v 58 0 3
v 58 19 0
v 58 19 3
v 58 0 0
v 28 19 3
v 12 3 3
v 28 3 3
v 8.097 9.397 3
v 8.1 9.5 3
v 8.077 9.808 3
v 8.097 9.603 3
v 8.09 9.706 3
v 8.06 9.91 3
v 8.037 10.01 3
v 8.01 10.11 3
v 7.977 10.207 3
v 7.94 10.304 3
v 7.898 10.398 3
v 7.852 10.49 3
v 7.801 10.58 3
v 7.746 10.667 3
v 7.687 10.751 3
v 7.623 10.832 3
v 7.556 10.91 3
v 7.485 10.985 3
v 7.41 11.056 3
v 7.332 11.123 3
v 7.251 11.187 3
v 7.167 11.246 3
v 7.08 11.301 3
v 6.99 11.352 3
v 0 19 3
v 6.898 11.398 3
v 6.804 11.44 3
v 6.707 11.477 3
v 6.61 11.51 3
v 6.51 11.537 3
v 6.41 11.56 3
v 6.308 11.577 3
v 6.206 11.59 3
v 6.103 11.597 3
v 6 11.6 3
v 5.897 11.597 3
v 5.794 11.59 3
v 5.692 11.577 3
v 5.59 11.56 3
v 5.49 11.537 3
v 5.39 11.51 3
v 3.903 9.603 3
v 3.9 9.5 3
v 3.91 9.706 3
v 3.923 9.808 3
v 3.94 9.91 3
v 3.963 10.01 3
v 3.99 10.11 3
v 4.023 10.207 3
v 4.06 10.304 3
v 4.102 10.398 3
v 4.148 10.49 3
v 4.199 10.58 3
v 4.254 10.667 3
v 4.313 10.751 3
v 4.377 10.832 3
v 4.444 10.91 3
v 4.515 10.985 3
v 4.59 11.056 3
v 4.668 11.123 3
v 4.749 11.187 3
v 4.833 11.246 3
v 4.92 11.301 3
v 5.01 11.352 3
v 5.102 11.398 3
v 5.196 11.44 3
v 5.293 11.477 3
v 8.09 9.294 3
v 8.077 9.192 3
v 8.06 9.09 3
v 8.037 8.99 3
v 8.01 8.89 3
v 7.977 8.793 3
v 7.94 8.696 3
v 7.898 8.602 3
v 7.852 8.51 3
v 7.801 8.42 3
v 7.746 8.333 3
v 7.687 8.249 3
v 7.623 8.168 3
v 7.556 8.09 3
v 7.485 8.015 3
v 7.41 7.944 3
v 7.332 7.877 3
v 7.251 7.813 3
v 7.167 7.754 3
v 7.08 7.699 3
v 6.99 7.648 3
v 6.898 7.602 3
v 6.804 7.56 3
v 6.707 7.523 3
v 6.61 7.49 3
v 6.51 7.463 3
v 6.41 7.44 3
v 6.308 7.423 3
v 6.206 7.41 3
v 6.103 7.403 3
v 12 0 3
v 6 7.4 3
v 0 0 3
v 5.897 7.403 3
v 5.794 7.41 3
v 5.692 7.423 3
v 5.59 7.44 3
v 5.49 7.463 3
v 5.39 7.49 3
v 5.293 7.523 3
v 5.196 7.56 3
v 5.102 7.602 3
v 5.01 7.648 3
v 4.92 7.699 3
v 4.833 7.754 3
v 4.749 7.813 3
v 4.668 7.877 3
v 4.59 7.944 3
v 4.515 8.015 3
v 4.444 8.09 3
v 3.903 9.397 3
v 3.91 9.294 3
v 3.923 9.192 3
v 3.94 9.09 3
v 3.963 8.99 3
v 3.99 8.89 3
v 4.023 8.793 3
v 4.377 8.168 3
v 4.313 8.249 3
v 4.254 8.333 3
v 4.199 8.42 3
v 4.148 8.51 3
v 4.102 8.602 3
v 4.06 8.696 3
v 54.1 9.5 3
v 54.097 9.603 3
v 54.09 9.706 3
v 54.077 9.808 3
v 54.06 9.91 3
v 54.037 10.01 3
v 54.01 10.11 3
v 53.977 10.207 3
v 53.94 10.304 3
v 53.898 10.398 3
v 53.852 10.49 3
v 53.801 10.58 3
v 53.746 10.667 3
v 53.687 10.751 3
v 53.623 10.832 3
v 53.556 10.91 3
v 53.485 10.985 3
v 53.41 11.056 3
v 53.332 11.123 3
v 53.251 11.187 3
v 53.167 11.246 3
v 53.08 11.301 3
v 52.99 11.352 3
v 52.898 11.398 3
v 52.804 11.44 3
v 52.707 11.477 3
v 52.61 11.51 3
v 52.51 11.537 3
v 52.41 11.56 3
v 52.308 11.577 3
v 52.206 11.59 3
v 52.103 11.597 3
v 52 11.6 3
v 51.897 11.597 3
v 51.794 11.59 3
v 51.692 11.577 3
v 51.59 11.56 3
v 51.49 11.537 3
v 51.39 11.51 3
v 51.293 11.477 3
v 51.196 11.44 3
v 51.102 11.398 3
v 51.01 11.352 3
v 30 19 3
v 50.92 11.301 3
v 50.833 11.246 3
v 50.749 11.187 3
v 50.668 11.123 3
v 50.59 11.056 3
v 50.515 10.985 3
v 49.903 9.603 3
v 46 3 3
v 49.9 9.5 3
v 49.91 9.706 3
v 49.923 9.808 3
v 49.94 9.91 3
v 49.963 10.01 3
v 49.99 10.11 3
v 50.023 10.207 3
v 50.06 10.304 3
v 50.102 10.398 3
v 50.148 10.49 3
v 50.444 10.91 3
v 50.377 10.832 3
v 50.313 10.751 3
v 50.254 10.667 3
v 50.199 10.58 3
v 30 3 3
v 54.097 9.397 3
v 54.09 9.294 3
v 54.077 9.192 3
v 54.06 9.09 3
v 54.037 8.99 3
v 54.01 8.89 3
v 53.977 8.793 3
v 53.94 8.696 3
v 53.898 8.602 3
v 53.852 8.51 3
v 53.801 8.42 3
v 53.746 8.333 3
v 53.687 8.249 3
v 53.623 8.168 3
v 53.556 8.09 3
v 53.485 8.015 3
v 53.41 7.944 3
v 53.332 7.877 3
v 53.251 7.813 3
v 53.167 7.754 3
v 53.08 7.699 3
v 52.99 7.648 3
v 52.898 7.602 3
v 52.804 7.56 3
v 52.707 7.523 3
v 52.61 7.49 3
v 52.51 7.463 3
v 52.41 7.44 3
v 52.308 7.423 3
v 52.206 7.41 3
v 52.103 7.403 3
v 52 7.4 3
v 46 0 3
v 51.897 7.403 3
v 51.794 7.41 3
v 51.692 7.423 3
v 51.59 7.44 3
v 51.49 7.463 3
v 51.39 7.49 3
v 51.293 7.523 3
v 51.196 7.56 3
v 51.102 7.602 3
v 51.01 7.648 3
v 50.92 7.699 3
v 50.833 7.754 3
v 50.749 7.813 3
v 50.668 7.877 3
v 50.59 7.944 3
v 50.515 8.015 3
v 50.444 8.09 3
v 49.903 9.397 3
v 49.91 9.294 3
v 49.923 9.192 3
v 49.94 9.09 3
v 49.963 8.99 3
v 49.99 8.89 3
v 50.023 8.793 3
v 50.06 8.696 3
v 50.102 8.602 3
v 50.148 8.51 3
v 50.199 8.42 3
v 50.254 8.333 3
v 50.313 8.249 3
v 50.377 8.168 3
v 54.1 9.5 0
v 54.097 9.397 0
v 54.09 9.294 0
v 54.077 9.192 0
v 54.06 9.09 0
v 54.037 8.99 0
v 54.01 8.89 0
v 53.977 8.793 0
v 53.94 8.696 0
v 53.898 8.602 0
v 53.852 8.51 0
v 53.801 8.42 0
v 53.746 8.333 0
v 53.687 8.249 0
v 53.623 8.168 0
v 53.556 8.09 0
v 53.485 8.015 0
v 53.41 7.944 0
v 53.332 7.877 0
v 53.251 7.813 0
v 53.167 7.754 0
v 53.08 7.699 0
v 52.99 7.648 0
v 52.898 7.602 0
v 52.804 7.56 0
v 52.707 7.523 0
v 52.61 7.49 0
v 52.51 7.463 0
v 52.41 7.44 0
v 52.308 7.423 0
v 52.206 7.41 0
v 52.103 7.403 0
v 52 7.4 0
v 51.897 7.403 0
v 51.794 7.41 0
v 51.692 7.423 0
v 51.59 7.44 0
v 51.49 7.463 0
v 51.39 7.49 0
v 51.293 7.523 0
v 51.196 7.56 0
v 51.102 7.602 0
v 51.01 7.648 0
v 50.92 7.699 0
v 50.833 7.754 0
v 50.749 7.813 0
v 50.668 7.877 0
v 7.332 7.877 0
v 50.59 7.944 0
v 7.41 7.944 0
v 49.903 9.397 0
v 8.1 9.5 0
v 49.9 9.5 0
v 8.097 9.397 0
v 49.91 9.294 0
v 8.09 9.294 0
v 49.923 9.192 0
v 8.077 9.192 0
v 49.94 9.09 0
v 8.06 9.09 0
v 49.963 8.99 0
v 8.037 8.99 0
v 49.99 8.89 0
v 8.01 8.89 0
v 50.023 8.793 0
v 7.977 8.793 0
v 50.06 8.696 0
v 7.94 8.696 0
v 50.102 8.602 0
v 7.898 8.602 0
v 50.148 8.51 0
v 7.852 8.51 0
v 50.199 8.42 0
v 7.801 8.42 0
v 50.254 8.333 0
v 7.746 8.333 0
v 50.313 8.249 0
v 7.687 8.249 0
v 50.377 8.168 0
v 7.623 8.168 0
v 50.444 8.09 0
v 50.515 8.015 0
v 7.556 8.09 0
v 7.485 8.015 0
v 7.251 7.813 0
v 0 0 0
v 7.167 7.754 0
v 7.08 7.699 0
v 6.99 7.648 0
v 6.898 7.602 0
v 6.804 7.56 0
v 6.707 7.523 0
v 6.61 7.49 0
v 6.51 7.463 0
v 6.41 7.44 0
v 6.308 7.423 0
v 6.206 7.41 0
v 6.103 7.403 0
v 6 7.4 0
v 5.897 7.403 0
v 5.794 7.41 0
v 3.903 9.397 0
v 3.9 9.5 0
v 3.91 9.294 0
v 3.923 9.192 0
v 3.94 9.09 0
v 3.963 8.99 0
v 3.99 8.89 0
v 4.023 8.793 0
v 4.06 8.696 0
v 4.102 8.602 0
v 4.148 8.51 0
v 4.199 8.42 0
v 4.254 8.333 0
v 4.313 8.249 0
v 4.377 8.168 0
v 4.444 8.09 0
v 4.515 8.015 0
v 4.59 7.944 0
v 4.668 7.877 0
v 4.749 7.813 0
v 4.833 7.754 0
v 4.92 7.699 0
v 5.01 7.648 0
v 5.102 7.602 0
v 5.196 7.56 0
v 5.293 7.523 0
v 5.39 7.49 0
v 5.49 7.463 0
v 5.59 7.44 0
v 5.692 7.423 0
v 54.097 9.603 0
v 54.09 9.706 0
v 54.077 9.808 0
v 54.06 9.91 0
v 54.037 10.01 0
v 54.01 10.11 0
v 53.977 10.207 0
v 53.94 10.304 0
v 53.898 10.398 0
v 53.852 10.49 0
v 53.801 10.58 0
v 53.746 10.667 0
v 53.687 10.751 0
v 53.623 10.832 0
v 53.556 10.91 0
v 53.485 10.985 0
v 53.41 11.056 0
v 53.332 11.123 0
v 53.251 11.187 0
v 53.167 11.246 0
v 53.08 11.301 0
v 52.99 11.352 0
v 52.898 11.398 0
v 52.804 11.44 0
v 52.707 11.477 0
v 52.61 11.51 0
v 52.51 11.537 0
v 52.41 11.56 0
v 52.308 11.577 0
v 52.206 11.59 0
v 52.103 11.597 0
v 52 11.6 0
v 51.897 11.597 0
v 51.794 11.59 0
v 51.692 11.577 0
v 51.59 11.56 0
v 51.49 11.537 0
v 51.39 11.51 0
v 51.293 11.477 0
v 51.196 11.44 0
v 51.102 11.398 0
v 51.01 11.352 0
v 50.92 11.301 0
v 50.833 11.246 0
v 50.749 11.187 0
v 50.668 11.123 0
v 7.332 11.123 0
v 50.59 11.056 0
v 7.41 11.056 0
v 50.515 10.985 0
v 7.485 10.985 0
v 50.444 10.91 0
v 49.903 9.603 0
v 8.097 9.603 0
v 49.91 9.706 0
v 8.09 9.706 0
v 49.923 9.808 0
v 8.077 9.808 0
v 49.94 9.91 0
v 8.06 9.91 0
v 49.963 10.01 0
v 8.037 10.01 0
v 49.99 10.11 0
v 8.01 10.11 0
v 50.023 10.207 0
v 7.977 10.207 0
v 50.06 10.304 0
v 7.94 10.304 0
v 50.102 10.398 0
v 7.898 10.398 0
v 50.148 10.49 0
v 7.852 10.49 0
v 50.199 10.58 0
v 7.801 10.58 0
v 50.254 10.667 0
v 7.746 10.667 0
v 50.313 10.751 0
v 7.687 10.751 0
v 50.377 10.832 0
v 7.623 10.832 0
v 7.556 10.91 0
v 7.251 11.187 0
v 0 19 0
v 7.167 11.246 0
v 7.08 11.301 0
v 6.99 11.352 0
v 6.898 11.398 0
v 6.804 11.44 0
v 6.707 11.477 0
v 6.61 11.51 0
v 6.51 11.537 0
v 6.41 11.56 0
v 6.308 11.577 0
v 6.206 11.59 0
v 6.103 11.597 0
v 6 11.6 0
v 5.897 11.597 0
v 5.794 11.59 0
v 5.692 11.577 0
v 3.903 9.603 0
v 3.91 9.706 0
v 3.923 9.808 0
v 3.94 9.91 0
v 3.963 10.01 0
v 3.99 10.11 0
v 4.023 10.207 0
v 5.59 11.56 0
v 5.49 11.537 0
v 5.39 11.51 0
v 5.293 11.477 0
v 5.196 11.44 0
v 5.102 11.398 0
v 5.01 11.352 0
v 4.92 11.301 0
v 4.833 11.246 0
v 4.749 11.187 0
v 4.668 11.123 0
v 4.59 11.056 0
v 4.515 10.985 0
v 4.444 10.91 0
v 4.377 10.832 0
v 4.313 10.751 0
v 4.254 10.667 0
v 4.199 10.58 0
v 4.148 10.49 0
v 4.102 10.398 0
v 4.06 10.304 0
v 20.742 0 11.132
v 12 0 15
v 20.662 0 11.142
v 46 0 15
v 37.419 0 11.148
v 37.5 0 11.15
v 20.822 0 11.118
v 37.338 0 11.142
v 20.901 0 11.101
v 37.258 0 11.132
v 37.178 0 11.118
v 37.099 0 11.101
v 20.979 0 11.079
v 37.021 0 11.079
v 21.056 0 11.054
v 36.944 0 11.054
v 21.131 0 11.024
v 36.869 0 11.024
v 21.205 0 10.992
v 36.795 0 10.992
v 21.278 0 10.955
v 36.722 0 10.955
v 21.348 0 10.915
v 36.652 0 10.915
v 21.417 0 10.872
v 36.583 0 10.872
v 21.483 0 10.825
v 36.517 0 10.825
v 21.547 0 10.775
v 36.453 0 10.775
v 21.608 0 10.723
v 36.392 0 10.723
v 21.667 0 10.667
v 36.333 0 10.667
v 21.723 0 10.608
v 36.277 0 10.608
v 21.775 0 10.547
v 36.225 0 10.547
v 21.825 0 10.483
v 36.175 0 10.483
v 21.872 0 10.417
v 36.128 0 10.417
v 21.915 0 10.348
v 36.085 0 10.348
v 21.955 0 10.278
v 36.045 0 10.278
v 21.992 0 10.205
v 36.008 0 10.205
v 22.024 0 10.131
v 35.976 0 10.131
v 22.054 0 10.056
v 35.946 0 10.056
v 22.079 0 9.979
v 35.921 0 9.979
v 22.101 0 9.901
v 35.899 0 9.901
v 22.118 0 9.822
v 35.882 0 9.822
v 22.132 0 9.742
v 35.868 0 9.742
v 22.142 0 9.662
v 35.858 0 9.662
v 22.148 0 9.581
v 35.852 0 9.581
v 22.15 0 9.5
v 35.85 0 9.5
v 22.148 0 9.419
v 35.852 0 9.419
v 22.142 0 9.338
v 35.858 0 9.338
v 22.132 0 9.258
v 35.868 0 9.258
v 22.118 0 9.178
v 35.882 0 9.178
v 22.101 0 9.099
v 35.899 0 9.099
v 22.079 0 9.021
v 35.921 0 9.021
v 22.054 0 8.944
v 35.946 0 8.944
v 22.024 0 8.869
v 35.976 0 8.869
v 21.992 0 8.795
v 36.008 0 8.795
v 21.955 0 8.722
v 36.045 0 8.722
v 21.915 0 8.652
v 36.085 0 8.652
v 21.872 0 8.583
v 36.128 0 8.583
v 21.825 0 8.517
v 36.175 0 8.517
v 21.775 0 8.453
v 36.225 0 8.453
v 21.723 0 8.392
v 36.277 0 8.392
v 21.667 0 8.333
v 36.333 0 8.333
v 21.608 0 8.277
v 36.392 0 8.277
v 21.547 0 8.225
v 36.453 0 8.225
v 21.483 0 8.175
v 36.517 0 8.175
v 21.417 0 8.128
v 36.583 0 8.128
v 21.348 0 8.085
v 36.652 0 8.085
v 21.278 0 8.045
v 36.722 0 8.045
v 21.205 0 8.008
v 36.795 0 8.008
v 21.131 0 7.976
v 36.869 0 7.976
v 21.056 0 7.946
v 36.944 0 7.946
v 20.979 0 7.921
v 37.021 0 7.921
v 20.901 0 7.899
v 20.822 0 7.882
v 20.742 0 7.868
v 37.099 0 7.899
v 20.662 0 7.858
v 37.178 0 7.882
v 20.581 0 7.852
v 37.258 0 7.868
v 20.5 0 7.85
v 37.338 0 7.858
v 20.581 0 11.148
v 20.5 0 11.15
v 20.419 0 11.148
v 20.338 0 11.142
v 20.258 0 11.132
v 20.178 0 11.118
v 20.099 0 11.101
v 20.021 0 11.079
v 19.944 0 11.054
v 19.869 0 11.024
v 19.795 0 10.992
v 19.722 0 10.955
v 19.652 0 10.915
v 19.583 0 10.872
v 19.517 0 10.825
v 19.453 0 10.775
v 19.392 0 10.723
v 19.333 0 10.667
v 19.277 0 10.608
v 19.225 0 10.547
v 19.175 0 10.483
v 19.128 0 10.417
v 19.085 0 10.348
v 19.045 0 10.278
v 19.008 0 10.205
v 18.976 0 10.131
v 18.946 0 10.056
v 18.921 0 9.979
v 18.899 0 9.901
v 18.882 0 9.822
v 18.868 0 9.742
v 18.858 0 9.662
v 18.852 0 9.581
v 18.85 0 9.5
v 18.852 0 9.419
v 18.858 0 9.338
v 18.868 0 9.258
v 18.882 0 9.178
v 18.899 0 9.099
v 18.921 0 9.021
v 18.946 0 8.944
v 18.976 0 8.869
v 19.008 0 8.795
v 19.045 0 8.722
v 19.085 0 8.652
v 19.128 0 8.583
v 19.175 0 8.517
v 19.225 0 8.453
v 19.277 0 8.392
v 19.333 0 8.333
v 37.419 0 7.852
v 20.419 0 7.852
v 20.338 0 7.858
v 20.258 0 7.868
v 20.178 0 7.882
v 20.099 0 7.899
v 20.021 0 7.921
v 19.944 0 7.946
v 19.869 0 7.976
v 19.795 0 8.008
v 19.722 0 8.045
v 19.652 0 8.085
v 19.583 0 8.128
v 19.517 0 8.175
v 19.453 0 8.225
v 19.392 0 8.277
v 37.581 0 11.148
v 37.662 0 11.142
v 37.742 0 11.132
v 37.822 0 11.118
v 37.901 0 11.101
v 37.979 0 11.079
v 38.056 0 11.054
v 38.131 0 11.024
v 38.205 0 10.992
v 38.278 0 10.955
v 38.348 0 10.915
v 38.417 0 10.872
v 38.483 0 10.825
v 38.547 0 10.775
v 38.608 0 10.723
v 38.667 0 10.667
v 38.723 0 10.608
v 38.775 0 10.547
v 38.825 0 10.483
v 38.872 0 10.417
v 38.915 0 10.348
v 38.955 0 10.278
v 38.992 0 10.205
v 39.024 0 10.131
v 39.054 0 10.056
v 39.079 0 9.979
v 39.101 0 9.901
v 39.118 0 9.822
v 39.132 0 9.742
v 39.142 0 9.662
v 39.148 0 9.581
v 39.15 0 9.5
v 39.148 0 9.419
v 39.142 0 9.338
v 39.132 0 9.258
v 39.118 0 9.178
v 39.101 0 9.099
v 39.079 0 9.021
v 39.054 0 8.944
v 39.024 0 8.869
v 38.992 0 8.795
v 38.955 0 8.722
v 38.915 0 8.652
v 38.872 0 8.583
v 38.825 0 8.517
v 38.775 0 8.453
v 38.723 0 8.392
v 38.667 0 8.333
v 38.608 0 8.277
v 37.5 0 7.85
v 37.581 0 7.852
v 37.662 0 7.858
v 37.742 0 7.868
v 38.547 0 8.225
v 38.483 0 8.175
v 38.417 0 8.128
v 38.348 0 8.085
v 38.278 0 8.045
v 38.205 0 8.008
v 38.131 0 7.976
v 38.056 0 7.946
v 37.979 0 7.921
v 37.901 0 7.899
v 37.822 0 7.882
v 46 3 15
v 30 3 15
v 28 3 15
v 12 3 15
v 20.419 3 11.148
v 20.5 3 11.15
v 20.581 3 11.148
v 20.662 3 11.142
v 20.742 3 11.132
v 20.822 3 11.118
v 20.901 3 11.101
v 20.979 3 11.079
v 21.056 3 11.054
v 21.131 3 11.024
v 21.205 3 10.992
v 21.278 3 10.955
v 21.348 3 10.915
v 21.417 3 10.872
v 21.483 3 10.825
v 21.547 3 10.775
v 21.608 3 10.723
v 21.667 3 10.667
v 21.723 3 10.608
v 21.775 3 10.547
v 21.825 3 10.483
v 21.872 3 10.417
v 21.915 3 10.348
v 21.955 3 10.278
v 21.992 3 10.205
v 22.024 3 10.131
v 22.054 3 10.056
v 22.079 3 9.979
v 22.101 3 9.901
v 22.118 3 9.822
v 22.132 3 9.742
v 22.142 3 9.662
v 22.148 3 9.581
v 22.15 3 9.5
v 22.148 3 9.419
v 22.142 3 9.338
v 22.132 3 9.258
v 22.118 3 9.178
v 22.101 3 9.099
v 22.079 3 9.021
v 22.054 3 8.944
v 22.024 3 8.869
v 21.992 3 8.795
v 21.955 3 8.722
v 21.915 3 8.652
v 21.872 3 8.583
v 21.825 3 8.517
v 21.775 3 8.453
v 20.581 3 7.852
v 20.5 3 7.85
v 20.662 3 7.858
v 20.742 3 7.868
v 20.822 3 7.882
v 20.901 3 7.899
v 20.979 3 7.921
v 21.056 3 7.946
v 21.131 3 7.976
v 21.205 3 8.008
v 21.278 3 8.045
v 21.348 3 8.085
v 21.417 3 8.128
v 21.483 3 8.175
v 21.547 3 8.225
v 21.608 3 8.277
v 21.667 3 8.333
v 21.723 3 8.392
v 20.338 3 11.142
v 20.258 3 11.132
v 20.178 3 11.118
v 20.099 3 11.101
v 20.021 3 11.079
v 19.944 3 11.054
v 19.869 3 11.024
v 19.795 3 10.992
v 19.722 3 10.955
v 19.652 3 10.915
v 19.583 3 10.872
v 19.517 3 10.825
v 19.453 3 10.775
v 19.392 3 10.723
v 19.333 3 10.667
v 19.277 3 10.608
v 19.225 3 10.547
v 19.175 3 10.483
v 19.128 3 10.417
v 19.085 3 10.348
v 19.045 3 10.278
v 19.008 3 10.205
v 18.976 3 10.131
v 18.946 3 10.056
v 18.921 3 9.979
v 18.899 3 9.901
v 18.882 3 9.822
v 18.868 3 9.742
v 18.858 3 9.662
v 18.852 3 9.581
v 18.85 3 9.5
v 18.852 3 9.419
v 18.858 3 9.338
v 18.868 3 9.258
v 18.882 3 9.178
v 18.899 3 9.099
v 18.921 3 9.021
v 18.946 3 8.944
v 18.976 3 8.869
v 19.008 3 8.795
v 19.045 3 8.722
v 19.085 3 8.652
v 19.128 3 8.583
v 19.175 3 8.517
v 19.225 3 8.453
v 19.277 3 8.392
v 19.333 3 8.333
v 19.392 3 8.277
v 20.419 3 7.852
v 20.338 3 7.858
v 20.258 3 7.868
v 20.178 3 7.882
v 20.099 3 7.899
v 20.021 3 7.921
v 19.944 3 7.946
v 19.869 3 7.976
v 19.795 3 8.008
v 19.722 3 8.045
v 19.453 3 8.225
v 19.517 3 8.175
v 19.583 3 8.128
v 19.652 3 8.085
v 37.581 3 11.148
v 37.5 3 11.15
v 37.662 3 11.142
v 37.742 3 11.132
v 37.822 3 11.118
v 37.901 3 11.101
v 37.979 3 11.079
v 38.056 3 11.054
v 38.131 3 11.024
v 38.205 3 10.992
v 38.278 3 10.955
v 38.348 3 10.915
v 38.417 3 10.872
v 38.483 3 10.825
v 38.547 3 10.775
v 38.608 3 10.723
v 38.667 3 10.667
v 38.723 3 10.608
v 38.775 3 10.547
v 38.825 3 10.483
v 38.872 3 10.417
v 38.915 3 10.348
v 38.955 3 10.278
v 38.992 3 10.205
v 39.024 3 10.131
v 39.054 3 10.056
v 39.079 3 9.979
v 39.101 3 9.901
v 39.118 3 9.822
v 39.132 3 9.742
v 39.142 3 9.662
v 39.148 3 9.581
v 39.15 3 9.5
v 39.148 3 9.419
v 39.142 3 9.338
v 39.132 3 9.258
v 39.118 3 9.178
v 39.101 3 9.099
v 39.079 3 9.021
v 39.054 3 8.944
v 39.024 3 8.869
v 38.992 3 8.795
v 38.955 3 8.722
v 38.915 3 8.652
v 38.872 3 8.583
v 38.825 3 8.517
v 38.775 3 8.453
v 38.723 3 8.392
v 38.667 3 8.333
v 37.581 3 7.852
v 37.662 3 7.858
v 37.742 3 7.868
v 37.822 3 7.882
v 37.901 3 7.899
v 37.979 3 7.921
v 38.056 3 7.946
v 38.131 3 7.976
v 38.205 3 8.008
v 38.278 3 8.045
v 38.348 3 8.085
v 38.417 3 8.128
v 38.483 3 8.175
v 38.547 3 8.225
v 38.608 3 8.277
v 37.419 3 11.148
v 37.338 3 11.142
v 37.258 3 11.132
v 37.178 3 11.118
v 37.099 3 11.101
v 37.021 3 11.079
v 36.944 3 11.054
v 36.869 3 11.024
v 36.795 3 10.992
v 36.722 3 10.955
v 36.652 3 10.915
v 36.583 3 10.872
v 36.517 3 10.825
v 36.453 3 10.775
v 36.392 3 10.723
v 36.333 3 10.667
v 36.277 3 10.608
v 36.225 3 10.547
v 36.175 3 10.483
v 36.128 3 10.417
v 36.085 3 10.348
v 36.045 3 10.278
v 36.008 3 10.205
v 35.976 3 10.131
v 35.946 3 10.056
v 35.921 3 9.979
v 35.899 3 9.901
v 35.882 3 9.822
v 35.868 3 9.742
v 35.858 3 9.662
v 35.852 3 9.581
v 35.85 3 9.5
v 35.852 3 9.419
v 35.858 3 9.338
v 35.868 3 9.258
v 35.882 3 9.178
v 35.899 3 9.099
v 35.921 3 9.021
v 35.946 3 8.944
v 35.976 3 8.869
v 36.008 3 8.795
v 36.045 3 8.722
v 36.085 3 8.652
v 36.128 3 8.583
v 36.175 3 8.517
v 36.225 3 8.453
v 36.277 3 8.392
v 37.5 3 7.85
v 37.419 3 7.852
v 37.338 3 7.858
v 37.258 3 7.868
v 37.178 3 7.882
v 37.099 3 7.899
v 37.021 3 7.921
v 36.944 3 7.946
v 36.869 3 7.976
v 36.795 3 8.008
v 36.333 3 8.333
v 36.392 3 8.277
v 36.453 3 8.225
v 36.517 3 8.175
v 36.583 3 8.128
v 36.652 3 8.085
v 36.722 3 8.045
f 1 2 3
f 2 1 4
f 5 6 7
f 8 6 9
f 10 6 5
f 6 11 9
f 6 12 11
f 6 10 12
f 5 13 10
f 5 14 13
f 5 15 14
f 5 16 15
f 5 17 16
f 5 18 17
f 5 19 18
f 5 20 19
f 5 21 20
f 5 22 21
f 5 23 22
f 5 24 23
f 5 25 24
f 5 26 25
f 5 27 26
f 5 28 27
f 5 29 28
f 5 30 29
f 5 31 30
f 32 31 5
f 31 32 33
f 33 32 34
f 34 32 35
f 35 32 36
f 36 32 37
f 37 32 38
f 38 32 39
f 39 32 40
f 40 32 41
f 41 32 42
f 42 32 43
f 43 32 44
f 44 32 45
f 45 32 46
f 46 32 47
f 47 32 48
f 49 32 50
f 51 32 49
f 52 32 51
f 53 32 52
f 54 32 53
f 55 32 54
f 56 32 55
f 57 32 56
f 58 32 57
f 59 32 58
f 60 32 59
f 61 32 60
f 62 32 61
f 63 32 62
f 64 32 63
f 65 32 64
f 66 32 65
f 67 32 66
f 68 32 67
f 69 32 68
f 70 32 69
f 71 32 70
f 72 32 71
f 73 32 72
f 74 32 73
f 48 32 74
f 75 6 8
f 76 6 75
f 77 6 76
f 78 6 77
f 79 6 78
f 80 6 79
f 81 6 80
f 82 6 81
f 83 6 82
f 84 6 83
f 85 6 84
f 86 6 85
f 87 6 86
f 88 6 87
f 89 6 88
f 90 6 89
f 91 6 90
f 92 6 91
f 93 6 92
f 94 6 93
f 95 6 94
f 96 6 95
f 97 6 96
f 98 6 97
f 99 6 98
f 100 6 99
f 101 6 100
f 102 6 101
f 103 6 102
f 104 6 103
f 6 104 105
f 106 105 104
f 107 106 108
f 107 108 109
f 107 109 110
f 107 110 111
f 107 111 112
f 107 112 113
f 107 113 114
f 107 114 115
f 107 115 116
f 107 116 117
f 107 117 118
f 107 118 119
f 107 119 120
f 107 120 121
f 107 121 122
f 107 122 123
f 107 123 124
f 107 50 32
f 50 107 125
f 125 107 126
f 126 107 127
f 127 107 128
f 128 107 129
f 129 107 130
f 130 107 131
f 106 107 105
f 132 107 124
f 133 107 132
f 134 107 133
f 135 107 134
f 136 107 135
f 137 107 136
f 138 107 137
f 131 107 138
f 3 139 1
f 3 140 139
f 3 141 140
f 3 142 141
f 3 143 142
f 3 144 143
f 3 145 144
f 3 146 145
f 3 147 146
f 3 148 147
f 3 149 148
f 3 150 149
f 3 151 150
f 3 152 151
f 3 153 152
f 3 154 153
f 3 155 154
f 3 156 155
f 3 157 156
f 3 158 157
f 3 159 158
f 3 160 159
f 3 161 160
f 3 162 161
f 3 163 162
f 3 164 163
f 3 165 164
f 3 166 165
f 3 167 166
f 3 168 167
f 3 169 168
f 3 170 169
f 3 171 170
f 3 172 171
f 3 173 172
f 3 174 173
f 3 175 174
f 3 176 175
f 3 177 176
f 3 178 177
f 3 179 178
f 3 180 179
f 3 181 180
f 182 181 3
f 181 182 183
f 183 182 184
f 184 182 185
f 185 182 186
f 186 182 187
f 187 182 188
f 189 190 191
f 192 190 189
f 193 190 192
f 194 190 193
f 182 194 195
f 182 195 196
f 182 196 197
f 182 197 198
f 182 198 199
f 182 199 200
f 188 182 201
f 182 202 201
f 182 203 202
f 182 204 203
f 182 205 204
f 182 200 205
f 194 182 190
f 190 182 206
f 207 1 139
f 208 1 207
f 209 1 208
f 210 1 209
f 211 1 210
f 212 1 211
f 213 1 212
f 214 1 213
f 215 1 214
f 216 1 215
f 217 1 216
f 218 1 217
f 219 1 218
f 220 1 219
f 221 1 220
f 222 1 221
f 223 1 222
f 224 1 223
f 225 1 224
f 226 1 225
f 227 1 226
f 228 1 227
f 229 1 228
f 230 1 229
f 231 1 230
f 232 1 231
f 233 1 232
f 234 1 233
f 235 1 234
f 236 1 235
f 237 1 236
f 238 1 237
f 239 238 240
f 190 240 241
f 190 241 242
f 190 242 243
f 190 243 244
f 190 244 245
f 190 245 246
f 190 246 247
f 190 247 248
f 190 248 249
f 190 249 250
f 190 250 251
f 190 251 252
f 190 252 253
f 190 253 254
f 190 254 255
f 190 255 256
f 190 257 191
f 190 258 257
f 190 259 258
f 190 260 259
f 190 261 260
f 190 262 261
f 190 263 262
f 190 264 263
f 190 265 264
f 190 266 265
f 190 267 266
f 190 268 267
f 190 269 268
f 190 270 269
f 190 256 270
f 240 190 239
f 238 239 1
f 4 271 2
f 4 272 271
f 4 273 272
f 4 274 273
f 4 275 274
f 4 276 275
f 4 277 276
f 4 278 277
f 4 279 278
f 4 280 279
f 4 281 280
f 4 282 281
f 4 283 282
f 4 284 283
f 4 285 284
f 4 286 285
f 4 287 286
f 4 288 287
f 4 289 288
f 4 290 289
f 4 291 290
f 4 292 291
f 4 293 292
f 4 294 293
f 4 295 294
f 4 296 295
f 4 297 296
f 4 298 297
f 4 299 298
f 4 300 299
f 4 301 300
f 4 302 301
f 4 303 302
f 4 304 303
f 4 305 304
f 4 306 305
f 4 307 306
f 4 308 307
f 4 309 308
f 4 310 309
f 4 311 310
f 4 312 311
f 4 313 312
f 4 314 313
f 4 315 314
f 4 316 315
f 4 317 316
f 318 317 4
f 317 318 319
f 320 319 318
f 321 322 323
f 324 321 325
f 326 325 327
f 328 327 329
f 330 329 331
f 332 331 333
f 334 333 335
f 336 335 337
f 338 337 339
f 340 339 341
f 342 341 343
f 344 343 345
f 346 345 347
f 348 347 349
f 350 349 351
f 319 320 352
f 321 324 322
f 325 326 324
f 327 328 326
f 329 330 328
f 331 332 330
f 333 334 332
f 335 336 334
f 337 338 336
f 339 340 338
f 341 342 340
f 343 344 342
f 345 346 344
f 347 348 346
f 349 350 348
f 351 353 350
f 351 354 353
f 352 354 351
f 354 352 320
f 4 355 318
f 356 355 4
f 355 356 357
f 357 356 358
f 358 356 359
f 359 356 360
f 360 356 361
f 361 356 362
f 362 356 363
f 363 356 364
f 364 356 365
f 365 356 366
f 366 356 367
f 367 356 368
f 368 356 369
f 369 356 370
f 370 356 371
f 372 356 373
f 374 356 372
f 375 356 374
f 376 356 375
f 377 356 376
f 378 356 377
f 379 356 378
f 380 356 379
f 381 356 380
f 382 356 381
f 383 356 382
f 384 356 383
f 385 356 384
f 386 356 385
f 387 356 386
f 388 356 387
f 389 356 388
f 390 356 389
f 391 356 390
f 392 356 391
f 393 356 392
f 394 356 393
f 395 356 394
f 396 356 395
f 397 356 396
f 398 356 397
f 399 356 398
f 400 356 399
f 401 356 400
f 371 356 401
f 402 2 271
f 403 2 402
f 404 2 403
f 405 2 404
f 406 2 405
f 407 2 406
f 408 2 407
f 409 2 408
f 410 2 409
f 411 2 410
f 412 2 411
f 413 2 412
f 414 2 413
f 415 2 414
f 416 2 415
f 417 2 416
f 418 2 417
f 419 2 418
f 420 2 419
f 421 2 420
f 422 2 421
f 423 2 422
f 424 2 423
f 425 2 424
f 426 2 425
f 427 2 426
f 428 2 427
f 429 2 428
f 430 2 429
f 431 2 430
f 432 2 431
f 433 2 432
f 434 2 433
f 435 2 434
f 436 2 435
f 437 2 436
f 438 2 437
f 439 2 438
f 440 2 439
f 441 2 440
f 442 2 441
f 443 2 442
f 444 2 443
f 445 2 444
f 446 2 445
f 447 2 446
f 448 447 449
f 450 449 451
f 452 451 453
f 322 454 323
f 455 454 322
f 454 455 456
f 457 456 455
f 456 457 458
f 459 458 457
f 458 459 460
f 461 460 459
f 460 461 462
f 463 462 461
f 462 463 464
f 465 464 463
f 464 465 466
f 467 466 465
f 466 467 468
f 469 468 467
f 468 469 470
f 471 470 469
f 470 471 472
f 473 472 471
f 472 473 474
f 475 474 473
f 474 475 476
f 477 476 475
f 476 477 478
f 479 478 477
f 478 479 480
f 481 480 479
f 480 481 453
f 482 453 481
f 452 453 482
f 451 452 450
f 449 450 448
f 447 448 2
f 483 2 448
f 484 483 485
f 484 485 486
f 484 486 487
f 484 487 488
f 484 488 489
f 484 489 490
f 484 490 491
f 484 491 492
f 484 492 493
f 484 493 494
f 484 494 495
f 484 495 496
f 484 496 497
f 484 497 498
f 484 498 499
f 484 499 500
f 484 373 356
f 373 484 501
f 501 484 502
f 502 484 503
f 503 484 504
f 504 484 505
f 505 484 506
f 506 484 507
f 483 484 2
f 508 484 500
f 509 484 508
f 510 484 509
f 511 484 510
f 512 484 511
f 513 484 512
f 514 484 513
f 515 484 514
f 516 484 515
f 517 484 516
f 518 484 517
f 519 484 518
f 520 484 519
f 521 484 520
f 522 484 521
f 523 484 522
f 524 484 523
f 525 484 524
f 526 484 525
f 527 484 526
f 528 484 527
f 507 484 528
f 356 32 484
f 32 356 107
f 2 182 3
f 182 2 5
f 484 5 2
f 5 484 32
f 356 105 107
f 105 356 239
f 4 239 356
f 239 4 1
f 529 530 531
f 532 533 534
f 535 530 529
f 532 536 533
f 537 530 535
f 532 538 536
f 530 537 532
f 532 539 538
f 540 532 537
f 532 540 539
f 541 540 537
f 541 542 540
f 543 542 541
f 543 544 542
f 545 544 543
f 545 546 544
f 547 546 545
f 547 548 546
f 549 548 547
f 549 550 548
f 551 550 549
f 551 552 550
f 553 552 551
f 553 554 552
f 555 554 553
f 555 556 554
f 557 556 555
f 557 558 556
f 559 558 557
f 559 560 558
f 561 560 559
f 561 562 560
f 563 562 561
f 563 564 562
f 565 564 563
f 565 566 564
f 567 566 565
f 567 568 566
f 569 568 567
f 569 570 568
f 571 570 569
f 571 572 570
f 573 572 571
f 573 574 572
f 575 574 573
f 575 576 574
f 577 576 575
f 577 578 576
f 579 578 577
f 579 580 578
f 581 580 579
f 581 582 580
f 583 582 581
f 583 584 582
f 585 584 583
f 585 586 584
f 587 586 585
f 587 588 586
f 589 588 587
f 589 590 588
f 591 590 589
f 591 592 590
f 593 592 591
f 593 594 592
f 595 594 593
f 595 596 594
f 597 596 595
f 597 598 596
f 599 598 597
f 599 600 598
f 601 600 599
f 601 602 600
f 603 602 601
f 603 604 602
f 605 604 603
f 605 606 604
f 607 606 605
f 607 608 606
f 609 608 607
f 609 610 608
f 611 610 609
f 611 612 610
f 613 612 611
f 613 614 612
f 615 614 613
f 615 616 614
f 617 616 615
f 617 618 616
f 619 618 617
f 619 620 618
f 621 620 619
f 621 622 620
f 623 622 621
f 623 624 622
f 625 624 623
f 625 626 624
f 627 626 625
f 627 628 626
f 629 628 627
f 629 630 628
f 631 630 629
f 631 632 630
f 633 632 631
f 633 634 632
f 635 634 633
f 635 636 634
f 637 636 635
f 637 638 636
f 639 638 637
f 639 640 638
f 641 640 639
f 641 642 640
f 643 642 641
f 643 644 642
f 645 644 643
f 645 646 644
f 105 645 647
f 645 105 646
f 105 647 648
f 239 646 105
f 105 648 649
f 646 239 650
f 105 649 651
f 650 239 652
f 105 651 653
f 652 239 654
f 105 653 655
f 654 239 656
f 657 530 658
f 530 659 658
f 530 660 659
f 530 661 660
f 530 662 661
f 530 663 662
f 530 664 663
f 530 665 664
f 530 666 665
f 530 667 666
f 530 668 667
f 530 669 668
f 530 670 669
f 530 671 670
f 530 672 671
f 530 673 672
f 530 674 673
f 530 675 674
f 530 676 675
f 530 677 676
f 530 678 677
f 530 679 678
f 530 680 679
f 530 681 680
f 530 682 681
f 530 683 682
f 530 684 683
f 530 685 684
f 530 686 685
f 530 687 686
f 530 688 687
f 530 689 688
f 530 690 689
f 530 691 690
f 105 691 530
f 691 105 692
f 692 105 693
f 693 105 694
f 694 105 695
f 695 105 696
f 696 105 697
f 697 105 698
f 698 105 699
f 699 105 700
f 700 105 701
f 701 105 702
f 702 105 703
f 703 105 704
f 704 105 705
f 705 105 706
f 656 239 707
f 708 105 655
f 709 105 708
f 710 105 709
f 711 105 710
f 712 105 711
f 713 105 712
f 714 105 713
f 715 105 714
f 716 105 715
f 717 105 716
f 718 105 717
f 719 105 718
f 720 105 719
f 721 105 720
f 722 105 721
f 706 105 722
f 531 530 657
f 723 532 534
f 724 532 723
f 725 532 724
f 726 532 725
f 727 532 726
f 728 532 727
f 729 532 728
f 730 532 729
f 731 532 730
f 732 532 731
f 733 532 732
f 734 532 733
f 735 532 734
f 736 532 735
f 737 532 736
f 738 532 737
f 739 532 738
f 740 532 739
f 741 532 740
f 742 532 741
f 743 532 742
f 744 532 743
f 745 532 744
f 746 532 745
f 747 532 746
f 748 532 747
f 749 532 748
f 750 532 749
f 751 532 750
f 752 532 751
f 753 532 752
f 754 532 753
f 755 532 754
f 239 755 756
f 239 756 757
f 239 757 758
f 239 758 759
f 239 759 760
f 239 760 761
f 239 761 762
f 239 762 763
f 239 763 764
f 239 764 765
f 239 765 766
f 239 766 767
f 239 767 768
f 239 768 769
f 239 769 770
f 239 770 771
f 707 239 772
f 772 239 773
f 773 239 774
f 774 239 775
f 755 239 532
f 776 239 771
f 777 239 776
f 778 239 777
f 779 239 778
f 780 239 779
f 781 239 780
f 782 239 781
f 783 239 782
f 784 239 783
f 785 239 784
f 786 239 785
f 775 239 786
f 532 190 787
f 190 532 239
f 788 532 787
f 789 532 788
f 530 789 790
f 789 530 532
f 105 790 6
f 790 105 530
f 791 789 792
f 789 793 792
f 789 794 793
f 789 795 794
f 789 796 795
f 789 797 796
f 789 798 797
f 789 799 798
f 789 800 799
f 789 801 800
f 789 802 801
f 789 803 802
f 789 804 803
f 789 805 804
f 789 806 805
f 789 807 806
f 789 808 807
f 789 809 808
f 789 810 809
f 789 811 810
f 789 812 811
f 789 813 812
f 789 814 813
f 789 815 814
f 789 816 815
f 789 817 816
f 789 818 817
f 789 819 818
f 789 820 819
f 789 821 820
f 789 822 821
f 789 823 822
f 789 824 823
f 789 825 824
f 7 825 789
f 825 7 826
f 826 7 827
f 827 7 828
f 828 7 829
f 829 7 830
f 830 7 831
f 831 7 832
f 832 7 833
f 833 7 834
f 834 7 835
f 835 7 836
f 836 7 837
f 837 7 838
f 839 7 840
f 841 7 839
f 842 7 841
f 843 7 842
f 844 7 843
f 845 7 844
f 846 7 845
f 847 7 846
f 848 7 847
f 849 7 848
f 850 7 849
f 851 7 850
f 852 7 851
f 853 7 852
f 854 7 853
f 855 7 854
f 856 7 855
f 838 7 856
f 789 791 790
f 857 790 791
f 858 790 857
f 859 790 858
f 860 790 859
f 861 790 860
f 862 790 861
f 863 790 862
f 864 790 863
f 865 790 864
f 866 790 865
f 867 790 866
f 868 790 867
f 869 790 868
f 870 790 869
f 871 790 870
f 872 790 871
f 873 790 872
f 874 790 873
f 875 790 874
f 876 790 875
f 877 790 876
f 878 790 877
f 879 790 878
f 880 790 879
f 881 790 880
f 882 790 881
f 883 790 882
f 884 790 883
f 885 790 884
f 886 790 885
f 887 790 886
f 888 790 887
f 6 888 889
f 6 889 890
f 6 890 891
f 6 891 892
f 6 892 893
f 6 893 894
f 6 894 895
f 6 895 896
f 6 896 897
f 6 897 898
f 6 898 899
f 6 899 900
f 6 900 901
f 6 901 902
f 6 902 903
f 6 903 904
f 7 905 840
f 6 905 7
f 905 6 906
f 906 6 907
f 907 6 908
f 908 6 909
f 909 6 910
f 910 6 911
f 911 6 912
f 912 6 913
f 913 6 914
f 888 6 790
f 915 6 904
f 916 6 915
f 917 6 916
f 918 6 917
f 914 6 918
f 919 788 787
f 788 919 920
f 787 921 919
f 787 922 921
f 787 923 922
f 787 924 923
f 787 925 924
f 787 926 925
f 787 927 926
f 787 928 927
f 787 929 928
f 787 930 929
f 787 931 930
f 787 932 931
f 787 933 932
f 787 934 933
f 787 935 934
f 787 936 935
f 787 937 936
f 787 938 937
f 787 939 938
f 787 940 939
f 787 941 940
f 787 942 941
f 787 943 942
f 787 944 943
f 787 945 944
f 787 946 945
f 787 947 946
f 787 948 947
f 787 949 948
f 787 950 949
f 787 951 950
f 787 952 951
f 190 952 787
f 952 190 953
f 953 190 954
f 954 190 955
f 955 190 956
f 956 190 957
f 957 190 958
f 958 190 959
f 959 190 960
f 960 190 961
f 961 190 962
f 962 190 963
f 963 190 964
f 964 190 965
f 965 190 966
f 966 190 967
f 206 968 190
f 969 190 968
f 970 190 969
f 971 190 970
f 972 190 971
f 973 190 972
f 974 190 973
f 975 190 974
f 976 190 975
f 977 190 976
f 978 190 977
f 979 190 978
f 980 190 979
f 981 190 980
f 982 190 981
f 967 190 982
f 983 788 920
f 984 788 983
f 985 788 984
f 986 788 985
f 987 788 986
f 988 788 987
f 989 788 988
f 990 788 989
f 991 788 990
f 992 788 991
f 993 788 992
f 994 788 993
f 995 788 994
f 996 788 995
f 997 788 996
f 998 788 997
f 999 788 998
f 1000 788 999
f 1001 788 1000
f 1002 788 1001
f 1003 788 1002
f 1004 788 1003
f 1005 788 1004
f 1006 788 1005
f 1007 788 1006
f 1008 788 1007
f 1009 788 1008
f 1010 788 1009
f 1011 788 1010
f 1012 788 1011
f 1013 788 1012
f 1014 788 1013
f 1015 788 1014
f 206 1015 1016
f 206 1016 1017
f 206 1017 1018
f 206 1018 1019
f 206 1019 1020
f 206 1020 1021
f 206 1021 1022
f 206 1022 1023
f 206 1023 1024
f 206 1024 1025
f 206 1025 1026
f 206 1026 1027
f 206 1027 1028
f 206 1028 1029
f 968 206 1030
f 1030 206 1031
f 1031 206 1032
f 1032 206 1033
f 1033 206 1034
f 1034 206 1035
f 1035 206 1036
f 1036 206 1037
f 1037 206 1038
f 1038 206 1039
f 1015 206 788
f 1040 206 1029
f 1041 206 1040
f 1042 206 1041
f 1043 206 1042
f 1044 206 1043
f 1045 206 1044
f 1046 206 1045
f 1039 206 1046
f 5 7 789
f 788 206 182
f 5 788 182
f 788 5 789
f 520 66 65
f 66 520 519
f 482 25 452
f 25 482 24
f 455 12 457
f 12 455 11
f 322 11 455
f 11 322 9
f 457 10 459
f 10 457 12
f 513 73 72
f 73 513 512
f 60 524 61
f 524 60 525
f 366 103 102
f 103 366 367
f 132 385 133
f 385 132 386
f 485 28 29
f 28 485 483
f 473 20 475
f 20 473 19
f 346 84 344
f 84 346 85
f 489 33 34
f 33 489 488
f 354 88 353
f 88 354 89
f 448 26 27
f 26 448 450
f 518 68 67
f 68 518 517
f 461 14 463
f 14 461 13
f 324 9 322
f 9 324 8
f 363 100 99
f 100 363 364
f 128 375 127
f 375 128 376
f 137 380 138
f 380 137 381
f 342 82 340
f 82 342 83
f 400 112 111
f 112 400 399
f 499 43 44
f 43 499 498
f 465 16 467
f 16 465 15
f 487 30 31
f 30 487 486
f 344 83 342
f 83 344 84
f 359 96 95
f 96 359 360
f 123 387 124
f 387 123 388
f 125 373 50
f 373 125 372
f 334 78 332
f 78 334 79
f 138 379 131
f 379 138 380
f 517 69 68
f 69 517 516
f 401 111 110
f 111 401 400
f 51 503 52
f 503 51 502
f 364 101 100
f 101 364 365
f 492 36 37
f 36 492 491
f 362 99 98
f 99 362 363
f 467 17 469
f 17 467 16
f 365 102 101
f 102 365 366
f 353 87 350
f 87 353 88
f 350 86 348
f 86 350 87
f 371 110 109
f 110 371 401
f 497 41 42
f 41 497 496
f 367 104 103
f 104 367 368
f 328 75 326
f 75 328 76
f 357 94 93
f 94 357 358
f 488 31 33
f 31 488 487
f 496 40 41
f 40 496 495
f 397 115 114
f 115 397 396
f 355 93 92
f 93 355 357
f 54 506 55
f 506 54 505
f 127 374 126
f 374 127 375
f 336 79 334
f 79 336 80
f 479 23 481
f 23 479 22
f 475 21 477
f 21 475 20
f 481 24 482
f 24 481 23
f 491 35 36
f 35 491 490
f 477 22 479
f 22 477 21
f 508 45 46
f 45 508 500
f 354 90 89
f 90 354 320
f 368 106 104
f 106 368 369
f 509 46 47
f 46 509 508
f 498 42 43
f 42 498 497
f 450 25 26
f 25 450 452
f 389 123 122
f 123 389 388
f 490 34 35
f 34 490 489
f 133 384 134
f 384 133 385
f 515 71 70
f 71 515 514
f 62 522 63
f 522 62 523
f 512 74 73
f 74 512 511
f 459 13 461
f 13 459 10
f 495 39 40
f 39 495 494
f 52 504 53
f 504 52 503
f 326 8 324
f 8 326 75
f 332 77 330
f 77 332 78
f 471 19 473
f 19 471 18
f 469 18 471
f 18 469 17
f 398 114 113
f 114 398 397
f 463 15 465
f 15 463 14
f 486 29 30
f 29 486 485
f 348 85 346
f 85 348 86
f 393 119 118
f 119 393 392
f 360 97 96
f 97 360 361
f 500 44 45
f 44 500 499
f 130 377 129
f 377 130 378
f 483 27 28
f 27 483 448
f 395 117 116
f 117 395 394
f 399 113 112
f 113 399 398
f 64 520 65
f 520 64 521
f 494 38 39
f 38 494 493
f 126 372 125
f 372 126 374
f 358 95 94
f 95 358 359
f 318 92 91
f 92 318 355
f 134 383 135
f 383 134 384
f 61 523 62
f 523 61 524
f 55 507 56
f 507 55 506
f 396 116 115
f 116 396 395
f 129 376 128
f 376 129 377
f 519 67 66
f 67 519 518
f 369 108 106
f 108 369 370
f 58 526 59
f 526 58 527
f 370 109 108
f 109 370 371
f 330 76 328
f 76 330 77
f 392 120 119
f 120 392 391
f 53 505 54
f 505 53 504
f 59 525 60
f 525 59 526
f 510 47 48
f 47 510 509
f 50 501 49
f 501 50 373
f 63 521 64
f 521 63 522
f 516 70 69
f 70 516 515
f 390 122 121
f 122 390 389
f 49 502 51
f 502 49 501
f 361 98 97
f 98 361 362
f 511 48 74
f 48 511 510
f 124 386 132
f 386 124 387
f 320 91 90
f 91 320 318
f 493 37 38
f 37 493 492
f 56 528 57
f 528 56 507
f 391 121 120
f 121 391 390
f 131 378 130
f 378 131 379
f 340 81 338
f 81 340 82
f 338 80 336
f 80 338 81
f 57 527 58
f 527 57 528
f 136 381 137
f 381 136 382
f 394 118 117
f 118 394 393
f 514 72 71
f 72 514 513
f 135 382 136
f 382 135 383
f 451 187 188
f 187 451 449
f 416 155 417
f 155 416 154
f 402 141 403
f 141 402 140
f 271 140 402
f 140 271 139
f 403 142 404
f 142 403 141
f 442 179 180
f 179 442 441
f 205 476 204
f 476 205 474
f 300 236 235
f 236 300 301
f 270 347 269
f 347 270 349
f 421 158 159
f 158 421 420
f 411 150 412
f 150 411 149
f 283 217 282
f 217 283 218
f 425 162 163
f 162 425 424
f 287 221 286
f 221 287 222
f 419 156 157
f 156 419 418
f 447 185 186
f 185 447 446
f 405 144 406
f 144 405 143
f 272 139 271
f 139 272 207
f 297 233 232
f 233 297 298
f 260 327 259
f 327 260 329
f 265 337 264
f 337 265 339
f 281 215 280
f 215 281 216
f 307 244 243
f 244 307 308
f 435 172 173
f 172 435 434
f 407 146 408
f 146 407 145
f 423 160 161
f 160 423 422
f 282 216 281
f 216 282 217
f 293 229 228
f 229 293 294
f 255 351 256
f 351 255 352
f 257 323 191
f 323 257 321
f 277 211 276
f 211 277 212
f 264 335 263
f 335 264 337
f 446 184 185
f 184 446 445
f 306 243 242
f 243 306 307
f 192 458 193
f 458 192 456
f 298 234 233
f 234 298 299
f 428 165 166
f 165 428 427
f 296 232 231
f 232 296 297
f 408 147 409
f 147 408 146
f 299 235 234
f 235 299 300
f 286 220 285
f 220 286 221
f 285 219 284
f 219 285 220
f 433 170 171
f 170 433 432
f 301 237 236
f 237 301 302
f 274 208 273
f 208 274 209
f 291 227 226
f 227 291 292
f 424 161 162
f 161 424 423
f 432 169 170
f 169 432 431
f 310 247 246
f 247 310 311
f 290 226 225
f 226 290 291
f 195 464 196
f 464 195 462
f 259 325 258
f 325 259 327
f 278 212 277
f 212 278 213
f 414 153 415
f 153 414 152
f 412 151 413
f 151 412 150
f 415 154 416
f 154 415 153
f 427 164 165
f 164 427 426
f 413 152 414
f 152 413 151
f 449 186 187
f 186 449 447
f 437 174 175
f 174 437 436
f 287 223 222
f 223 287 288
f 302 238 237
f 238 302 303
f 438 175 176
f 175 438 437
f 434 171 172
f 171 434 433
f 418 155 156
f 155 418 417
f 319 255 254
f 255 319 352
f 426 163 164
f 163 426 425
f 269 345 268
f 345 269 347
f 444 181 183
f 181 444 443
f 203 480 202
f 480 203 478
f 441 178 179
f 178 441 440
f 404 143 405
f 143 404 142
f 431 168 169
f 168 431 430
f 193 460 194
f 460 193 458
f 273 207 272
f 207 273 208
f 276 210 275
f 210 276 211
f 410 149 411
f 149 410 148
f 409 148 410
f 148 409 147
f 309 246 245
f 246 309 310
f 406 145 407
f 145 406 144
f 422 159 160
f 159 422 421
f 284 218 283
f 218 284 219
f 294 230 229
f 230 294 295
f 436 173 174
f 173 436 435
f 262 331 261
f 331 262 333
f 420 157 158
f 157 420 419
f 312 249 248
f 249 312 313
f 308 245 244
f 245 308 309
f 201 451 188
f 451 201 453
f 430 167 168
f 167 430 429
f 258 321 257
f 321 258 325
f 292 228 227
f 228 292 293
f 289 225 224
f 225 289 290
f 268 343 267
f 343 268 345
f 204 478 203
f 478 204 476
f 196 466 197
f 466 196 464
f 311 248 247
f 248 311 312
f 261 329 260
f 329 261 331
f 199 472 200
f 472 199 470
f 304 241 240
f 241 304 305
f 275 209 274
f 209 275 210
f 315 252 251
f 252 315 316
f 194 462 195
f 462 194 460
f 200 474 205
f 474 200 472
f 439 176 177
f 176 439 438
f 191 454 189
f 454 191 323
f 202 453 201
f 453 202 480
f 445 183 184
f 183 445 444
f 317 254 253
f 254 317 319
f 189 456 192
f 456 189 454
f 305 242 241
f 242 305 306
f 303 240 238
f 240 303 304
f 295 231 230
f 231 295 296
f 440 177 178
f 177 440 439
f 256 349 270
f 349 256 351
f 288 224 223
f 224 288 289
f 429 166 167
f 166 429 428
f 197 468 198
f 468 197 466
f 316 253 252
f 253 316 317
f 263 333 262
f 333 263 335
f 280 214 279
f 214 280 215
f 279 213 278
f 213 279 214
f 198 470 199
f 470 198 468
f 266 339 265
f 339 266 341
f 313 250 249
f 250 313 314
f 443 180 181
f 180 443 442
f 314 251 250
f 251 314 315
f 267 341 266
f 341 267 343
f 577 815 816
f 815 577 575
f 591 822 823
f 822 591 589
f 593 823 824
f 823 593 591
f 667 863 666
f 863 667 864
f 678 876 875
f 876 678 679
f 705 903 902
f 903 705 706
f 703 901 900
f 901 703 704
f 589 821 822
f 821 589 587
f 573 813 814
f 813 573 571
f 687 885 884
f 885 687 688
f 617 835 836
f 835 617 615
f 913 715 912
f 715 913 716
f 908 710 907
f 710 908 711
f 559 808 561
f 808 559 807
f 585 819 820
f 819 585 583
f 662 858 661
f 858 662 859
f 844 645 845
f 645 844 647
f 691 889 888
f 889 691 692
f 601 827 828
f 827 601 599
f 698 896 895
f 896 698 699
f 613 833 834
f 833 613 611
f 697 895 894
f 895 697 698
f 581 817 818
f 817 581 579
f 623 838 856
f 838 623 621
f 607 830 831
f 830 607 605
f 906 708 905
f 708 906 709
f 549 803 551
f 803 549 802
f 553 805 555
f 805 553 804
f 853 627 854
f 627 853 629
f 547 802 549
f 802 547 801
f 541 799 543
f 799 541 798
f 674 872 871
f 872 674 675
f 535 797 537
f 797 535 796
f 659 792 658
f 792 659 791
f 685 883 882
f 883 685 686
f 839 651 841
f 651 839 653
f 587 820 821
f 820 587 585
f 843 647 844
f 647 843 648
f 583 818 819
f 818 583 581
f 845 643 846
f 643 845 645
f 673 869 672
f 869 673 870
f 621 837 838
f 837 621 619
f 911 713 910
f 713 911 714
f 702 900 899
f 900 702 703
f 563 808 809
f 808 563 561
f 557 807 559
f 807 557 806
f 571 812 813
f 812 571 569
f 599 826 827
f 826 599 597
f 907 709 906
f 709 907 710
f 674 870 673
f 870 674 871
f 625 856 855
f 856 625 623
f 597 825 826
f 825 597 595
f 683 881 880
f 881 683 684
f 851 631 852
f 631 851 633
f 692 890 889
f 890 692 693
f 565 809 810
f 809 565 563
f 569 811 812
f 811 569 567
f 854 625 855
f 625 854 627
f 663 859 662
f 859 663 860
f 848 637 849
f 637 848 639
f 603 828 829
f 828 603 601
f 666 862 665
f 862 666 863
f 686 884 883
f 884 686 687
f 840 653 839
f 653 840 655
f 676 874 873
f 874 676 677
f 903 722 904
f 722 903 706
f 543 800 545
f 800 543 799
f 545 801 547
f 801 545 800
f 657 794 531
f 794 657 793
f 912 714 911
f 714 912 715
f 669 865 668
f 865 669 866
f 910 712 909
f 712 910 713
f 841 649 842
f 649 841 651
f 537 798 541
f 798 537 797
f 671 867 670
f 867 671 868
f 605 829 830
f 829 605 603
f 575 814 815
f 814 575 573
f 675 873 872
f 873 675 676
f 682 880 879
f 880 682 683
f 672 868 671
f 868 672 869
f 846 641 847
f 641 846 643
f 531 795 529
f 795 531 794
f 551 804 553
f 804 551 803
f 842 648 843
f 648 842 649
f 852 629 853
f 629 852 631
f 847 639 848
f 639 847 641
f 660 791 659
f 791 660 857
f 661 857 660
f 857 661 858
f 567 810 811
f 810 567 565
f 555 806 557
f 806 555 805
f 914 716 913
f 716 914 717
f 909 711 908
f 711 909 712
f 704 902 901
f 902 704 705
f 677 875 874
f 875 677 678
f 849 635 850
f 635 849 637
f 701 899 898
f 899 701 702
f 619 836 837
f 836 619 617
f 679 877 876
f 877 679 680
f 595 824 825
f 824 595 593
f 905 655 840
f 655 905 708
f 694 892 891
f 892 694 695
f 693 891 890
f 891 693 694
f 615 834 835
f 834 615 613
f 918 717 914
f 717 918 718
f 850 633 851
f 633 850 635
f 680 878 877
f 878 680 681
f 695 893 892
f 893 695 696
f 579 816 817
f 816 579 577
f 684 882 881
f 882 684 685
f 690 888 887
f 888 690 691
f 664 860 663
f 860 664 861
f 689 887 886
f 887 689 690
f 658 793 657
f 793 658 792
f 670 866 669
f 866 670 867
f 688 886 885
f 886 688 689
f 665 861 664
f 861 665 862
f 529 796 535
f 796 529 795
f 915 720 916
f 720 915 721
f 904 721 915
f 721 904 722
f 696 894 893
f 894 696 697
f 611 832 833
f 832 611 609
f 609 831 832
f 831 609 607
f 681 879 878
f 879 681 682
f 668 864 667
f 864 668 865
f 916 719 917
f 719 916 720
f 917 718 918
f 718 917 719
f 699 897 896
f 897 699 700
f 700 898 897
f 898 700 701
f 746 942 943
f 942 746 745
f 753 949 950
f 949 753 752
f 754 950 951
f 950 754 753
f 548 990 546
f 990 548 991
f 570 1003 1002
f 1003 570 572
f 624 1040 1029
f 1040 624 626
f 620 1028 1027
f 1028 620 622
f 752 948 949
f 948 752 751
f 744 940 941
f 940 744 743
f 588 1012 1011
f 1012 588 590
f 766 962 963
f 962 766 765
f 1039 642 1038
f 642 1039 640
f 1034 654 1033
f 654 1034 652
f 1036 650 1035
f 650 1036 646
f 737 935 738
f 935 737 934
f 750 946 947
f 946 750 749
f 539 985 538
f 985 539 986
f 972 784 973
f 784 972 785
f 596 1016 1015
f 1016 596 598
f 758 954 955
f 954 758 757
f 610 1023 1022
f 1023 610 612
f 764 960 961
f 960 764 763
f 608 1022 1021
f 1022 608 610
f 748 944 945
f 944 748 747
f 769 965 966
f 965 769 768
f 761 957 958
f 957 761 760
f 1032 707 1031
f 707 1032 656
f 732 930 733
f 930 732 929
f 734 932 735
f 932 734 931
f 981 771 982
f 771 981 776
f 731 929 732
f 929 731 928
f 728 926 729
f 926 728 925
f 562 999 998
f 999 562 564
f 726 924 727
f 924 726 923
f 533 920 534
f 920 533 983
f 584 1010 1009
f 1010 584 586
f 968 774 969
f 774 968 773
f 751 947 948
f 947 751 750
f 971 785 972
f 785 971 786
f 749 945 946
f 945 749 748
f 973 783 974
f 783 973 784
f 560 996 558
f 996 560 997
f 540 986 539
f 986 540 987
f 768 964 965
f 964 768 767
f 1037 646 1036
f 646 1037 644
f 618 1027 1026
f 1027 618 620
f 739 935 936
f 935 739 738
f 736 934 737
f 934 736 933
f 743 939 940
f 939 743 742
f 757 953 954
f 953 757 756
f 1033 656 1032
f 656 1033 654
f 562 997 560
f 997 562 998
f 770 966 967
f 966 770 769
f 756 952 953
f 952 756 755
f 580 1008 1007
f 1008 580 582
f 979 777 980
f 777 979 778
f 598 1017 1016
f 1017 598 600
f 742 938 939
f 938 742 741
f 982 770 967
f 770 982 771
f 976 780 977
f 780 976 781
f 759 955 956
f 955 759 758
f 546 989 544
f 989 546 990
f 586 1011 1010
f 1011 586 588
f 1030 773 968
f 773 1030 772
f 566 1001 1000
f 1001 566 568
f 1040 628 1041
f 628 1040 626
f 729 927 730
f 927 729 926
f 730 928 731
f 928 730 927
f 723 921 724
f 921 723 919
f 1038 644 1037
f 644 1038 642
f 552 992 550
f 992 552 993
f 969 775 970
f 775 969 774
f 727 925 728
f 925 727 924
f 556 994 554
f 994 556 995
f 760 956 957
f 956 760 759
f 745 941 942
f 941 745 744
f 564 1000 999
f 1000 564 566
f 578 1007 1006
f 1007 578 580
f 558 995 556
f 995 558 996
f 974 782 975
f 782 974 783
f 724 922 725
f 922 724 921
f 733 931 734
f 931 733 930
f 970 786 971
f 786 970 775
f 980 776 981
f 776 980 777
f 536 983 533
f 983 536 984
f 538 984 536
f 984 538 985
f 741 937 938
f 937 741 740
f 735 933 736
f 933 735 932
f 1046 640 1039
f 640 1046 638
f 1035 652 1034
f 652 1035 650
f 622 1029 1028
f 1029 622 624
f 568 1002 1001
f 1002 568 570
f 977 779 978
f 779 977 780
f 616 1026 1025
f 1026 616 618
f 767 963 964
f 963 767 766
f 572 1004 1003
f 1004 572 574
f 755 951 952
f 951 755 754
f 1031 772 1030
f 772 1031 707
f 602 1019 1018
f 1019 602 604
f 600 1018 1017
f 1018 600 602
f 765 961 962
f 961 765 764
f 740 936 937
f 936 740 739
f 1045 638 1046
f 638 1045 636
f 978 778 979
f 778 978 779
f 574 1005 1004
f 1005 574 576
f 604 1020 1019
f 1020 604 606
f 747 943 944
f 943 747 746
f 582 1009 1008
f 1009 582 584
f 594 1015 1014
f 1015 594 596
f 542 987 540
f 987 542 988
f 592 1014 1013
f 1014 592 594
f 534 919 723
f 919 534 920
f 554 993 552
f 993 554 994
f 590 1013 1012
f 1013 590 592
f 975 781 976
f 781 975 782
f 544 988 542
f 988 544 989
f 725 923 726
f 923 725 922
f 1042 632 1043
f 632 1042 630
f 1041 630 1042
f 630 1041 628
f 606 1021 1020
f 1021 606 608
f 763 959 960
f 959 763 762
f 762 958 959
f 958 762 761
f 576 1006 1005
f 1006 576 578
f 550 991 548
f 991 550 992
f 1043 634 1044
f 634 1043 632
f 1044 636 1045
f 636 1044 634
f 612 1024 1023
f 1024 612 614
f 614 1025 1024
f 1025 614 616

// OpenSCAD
// file: Pieces.scad
$fn = 128;

module end_cap() {
    difference() {
        union() {
            for (i = [ 0 : 3 ]) {
                rotate([0, 0, i * 90]) {
                    translate([0,0,2.5]) linear_extrude(5)
                        polygon(points=[[-2.5,3.75],[-5.5,8],[-3,8],[-3, 10],
                                        [3,10],[3,8],[5.5,8],[2.5, 3.75]]);
                }
            }
            translate([-10,-10,0]) cube([20,20,2.5]);
            translate([-12.5,-10,0]) cube([2.5,20,22.5]);
            translate([-12.5,10,0]) cube([22.5,2.5,22.5]);
        }
        cylinder(20, 3, 3, center=true);
        translate([0,0,15]) rotate([90,0,0]) cylinder(40, 3, 3, center=true);
        translate([0,0,15]) rotate([0,90,0]) cylinder(40, 3, 3, center=true);
    }
}

module runner_cap() {
    union () {
        end_cap();
        translate([-27.5,-10,0]) difference() {
            translate([0,2.5, 0]) cube([15,15,10]);
            translate([5, 10, 7.5]) cylinder(10, 4.1, 4.1, center=true);
        }
        translate([-10,-30,0]) difference() {
            cube([20,20,2.5]);
            translate([10, 10, 0]) cylinder(10, 3, 3, center=true);
        }
        translate([-12.5, -10, 0]) rotate([0, 90, 0]) linear_extrude(2.5)
            polygon(points=[[0,0],[0,-20],[-2.5, -20], [-22.5, 0]]);
    }
}

module motor_bracket() {
    difference() {
        translate([0,0,0]) cube([44, 7, 42]);
        union() {
            translate([-1,5,9.5]) cube([24, 3, 23]);
            translate([-1,-1,17.5]) cube([24, 9, 7]);
            translate([23,9, 21]) rotate([90,0,0]) cylinder(4, 11.5, 11.5);
            translate([23,6, 21]) rotate([90,0,0]) cylinder(7, 3.5, 3.5);

            translate([6.5,-1, 5]) rotate([-90,0,0]) {
                cylinder(9, 2, 2);
                cylinder(3, 3.5, 3.5);
            }
            translate([6.5,-1, 36]) rotate([-90,0,0]) {
                cylinder(9, 2, 2);
                cylinder(3, 3.5, 3.5);
            }
            translate([37.5,-1, 5]) rotate([-90,0,0]) {
                cylinder(9, 2, 2);
                cylinder(3, 3.5, 3.5);
            }
            translate([37.5,-1, 36]) rotate([-90,0,0]) {
                cylinder(9, 2, 2);
                cylinder(3, 3.5, 3.5);
            }
        }
    }
}

module belt_bracket() {
    difference() {
        cube([30, 10, 10]);
        difference() {
            union() {
                translate([10, 8, 5]) rotate([90,0,0]) cylinder(9, 4, 4);
                translate([20, 8, 5]) rotate([90,0,0]) cylinder(9, 4, 4);
                translate([-1, -1, 1]) cube([11, 9, 8]);
                translate([20, -1, 1]) cube([11, 9, 8]);
            }

            union() {
                translate([10, 8, 5]) rotate([90,0,0]) cylinder(9, 2.5, 2.5);
                translate([20, 8, 5]) rotate([90,0,0]) cylinder(9, 2.5, 2.5);
                translate([-1, -1, 2.5]) cube([11, 9, 5]);
                translate([20, -1, 2.5]) cube([11, 9, 5]);
            }
        }
    }

    for(i = [0:5])
        translate([i*2, 8, 1]) rotate([90,0,0]) linear_extrude(8) polygon([[0,0], [1,0], [1,1.0]]);
    for(i = [0:5])
        translate([30-i*2, 0, 1]) rotate([90,0,180]) linear_extrude(8) polygon([[0,0], [1,0], [1,1.0]]);
}

module tension_bracket() {
    difference() {
        union() {
            cylinder(37.5, 16, 16);
            translate([-22, -16, 0]) cube([38, 32, 4]);
        }
        union() {
            difference() {
                translate([0,0,-0.5]) cylinder(38.5, 12.25, 12.5);
                translate([-20,-7.75,-0.5]) cube([40, 15.5, 38.5]);
            }
            translate([-20,-6,4]) cube([8, 12, 38.5]);
            translate([-12.5,-6,-0.5]) cube([35, 12, 38.5]);
            translate([-6,-20,4]) cube([12, 40, 29.5]);
            translate([-6.25,-10,-0.5]) cube([12.5, 20, 38.5]);
        }    
    }
}

belt_bracket();
// main file
use <Pieces.scad>
$fn = 128;

focus_offset = 35;

focus_ring_depth = 8;
mount_offset = 47.5;

gantry_offset = 69;
gantry_depth = 12;

b_offset = (focus_offset+focus_ring_depth+mount_offset) - (gantry_offset+gantry_depth);

module laser_bracket() {
    //translate([0, 55, 12]) 
    difference() {
        union() {
            cube([58, 19, 3]);
            translate([12, 0, 0]) cube([34, 3, 15]);
            translate([28, 0, 0]) rotate([90,0,90]) 
                linear_extrude(2) polygon([[3,3], [19, 3], [3, 15]]);
        }
        union() {
            translate([6, 9.5, -4.5]) cylinder(12.5, 2.1, 2.1);
            translate([52, 9.5, -4.5]) cylinder(12.5, 2.1, 2.1);

            translate([20.5, 9.5, b_offset]) rotate([90,0,0]) cylinder(12.5, 1.65, 1.65);
            translate([37.5, 9.5, b_offset]) rotate([90,0,0]) cylinder(12.5, 1.65, 1.65);
        }
    }

}

laser_bracket();
